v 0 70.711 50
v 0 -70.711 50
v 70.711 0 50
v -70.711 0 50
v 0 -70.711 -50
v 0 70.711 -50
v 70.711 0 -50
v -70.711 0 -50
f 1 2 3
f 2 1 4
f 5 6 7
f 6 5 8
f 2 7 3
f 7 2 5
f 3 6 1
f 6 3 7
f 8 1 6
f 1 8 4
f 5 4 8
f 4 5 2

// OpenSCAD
rotate(a=45.0, v=[0.0,0.0,1.0]){cube(size=[100.0000,100.0000,100.0000],center=true);}
